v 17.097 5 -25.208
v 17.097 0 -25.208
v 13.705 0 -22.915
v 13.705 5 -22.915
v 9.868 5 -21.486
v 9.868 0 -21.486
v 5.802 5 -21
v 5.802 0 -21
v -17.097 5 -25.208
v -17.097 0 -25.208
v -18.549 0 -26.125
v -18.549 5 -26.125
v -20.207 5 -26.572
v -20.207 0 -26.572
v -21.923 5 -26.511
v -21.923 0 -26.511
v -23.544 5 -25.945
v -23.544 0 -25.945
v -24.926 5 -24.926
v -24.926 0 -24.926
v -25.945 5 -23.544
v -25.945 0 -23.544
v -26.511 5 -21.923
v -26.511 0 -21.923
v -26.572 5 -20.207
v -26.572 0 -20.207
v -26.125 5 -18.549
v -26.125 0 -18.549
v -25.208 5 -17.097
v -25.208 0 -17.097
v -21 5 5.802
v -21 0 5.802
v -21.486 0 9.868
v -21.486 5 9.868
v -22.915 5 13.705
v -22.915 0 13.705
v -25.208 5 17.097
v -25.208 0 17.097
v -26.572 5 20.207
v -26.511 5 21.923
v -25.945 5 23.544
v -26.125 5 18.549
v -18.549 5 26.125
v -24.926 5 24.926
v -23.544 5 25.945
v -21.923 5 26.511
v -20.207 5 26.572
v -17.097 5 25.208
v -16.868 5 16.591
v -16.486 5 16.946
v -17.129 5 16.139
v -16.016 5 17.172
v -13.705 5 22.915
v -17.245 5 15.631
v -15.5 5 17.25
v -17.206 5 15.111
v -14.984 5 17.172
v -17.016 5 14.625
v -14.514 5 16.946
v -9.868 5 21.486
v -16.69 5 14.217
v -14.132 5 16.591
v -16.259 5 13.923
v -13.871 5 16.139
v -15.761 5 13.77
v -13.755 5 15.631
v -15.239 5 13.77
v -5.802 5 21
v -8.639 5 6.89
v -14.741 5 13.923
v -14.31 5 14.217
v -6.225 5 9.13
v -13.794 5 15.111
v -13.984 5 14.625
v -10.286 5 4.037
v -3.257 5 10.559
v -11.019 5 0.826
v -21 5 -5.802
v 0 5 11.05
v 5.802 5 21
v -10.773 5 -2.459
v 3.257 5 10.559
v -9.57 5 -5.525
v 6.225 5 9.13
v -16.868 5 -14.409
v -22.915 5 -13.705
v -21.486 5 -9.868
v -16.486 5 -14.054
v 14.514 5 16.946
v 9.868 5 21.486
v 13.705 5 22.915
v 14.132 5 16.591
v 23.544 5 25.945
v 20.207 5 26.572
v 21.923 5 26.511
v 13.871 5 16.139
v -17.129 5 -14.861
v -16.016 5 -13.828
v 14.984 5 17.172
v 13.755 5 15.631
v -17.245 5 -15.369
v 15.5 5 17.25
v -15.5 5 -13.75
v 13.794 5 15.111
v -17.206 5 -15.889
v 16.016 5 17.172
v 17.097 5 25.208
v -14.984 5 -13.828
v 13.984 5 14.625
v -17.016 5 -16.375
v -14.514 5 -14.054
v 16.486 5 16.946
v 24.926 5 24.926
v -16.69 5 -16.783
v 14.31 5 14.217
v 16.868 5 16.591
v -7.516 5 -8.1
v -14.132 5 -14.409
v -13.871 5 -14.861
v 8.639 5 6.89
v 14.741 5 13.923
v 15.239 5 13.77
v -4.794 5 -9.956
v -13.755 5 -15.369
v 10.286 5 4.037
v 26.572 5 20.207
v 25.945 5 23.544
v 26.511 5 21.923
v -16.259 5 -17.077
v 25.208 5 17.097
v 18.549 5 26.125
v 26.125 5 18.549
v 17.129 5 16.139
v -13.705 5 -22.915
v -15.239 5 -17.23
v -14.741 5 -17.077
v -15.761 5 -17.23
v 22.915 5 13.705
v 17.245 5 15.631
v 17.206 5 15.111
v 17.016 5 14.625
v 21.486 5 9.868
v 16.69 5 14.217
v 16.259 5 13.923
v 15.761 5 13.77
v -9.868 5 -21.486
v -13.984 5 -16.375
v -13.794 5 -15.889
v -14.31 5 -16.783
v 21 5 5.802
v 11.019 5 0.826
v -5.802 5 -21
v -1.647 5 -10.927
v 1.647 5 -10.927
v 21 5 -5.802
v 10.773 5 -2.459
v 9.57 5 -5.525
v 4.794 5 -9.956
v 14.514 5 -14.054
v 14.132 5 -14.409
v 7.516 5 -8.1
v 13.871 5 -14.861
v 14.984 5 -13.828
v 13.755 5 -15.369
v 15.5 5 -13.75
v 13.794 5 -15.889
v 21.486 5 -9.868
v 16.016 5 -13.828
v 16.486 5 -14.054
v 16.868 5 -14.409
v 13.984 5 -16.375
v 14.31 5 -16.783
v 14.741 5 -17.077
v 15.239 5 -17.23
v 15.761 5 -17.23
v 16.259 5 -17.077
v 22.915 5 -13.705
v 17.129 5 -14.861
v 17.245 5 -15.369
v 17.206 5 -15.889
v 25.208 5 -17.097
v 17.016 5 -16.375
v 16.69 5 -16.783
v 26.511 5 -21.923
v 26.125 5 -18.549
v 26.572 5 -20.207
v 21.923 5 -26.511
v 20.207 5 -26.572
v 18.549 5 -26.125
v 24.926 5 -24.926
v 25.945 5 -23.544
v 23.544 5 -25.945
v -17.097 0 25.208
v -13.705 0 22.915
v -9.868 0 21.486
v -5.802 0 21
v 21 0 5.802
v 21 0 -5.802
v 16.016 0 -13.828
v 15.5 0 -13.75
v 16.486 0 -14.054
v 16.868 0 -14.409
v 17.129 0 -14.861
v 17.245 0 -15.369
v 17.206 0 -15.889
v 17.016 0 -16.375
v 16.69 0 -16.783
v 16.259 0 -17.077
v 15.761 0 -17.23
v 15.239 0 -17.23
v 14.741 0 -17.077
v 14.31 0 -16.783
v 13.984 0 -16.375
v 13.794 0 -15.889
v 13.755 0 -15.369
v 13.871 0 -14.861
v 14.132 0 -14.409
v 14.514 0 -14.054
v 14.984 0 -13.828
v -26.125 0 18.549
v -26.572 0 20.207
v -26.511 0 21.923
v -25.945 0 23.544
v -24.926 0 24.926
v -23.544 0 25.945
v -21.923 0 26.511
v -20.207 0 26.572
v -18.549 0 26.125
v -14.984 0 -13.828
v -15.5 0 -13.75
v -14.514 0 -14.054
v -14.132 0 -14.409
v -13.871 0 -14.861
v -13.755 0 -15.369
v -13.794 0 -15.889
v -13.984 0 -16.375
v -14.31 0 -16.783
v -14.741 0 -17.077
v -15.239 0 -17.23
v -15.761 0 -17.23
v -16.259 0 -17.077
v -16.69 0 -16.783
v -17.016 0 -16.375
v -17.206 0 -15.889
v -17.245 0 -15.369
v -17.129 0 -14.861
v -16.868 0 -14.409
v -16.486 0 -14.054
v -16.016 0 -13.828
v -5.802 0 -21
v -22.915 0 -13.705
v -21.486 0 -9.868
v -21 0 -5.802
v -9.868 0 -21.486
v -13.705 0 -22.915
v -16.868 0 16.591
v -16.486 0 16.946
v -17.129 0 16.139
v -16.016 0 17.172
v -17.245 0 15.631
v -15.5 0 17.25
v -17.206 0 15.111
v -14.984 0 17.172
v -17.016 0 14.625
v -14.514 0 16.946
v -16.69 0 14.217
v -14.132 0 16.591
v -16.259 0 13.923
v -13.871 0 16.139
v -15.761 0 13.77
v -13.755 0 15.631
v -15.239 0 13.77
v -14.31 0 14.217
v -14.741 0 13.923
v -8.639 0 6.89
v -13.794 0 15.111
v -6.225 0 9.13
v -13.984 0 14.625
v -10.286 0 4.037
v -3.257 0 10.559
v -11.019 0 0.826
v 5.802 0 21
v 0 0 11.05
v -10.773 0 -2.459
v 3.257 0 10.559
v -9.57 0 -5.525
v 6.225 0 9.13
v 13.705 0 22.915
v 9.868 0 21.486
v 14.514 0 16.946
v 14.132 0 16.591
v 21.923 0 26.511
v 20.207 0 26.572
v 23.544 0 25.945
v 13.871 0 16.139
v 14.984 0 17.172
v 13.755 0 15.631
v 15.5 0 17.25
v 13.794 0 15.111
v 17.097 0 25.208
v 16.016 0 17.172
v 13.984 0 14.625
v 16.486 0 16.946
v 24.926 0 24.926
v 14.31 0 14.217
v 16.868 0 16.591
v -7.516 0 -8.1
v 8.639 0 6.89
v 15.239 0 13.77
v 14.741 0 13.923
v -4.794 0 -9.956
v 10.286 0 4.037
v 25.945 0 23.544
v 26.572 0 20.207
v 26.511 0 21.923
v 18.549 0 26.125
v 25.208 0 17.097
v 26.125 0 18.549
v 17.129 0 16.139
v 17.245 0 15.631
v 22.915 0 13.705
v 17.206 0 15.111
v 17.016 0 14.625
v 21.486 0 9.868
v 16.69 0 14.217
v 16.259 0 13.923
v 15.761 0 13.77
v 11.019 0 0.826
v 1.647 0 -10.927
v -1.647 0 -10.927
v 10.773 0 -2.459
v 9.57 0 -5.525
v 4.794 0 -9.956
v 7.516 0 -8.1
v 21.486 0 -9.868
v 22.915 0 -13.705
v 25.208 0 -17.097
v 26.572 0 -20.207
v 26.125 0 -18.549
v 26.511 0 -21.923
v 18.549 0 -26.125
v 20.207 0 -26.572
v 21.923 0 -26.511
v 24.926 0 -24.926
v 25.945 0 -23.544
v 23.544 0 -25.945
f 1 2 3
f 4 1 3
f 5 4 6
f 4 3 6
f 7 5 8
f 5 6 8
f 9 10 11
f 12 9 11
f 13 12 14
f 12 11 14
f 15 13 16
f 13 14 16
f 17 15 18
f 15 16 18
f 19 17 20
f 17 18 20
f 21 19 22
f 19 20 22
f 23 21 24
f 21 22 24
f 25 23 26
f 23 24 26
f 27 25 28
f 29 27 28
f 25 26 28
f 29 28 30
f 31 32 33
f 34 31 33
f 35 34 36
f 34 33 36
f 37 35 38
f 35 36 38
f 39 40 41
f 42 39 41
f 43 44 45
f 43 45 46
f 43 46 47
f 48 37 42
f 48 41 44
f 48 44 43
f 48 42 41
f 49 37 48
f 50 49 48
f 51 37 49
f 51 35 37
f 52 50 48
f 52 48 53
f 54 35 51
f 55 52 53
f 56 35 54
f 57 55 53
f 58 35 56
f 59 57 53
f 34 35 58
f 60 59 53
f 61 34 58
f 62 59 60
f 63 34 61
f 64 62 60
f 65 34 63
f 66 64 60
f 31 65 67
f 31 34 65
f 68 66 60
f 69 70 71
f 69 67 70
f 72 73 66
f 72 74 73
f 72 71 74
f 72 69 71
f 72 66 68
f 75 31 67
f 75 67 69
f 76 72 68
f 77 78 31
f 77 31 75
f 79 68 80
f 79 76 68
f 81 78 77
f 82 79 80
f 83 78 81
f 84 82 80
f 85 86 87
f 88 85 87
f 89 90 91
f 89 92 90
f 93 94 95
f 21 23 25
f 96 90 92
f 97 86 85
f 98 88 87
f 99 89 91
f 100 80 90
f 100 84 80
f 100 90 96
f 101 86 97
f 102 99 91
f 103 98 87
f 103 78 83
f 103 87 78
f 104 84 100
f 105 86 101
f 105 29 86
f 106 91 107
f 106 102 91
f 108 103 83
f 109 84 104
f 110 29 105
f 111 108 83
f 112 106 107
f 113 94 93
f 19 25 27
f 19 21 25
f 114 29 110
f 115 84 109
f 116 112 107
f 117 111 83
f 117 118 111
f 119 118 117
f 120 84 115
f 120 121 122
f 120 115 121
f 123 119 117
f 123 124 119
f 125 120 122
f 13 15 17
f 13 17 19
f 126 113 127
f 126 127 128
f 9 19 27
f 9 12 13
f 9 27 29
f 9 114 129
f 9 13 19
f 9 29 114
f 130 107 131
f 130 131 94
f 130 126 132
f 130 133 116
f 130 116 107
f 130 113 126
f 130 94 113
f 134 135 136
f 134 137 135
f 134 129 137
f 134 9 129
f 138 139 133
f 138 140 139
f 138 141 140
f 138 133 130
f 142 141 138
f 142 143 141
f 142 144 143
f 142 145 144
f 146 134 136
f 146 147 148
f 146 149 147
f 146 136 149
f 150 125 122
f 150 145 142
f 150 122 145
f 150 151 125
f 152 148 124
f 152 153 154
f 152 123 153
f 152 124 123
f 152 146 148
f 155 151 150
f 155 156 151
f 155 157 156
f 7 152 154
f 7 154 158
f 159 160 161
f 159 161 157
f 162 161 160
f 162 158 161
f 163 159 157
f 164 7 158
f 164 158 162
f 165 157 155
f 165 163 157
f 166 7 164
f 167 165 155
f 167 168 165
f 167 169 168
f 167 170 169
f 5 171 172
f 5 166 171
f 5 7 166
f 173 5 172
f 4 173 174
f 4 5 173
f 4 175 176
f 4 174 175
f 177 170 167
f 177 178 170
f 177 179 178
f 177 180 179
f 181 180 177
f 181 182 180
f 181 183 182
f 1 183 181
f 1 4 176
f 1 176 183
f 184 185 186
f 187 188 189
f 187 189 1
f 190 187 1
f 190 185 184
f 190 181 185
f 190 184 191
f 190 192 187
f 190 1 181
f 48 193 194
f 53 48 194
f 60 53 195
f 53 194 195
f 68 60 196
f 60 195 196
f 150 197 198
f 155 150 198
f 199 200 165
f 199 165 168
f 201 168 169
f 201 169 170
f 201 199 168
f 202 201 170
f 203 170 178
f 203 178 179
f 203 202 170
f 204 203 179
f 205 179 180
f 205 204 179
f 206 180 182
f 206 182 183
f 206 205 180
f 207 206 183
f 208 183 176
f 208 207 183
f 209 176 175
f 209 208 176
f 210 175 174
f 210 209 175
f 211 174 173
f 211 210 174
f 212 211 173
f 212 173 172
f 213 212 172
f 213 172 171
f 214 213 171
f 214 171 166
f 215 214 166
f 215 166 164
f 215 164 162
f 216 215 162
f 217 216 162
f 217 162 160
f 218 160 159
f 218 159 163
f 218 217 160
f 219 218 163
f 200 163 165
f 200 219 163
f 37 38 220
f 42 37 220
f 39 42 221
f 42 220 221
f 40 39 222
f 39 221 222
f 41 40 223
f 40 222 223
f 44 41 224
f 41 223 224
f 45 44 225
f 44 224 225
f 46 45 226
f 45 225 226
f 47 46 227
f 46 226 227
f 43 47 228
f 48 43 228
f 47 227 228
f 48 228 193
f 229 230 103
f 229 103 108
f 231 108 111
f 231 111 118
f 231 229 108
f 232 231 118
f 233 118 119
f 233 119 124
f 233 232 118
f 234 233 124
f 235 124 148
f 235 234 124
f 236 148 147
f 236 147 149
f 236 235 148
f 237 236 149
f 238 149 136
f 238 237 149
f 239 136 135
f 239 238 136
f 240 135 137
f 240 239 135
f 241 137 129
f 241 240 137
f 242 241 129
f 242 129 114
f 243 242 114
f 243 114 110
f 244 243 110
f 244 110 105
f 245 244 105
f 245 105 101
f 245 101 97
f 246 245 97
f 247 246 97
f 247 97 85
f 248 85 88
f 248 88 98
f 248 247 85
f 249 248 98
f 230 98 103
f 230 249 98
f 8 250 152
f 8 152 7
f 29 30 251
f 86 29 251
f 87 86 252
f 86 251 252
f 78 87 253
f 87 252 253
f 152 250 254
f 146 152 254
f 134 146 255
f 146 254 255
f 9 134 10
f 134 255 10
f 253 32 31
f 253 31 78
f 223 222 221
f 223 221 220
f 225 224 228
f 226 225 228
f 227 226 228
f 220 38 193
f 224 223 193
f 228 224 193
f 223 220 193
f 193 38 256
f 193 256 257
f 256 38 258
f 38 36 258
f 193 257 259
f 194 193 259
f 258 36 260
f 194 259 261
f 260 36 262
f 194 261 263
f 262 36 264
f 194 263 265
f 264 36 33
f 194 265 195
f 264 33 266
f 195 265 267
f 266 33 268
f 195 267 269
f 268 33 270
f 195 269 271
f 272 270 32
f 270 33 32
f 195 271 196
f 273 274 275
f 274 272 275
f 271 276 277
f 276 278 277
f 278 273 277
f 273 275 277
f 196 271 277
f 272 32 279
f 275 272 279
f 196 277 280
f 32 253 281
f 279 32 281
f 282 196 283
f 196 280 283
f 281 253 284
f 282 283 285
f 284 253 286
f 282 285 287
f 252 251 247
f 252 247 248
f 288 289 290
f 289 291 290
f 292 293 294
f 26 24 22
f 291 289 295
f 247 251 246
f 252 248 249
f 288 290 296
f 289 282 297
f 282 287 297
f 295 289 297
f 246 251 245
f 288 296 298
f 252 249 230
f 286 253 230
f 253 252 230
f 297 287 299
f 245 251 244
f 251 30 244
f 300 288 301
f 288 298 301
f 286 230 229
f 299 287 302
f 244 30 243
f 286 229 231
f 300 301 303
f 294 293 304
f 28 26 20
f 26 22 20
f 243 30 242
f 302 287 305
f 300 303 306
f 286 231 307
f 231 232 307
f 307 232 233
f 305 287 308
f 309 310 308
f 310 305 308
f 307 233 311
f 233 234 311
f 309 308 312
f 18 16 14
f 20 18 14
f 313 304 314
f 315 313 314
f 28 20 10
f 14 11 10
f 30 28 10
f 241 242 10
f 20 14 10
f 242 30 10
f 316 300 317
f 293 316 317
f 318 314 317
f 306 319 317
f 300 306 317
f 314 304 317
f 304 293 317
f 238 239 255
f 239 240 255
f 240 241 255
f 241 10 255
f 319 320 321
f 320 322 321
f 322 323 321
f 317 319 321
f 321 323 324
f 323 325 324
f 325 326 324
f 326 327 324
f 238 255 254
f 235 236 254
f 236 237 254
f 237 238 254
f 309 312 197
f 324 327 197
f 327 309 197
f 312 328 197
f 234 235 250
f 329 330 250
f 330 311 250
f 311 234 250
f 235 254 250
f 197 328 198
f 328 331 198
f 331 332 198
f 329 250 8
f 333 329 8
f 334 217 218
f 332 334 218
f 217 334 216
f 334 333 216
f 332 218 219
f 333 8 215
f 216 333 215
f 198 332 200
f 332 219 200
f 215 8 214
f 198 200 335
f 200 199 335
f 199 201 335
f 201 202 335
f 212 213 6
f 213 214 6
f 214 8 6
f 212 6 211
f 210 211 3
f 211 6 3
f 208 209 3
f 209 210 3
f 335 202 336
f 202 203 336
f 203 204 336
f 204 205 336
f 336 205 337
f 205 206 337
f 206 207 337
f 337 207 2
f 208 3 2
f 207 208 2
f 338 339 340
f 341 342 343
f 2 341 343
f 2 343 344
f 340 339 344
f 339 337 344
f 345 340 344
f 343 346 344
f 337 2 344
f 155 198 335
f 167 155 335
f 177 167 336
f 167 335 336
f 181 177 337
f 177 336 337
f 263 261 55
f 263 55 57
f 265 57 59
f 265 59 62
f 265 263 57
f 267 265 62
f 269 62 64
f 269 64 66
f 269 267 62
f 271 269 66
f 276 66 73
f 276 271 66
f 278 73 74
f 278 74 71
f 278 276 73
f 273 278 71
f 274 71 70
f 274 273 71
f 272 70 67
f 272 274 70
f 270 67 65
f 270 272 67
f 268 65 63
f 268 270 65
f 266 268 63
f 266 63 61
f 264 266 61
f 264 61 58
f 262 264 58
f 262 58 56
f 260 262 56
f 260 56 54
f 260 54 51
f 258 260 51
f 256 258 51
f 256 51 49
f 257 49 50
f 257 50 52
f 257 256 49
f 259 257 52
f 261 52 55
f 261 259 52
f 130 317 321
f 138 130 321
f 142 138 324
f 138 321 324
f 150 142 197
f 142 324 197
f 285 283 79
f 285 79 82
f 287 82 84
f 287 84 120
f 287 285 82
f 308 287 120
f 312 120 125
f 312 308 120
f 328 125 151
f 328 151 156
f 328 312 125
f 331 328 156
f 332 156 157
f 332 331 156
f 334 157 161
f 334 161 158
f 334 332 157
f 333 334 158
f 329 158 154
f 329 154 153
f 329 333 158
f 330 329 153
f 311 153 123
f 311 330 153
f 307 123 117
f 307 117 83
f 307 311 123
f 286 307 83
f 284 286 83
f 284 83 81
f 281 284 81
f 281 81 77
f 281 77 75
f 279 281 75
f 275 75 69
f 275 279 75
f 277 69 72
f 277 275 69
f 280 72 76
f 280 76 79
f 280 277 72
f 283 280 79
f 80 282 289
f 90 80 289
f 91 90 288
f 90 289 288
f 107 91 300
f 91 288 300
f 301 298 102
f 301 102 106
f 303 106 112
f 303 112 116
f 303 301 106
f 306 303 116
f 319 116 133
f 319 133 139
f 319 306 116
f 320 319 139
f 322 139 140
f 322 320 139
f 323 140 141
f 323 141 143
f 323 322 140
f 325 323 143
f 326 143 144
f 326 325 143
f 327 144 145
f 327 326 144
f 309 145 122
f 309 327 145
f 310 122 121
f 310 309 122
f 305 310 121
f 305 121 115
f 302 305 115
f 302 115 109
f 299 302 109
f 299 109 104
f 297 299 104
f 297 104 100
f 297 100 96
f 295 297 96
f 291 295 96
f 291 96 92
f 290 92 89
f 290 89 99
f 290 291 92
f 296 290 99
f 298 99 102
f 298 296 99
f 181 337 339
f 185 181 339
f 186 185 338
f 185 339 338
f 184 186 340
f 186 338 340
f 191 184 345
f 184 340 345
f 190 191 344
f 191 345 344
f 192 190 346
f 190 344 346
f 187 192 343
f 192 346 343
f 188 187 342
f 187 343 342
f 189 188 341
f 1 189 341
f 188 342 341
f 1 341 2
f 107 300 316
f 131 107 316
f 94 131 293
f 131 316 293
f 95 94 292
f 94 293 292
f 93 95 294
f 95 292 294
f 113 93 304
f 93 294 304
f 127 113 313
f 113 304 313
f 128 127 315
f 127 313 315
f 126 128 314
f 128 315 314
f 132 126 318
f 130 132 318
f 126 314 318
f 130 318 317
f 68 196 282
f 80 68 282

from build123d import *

# Parameters (mm, degrees)
SKETCH_1_W      = 42
SKETCH_1_H      = 42
SKETCH_1_R      = 11.05
SKETCH_1_R_2    = 1.75
EXTRUDE_1_DEPTH = 5
EXTRUDE_2_DEPTH = 5


with BuildPart() as part:
    # 草图1 → 凸台-拉伸1 (new body)
    with BuildSketch(Plane(origin=(0, 0, 0), x_dir=(1, 0, 0), z_dir=(0, 1, 0))):
        Rectangle(SKETCH_1_W, SKETCH_1_H)
        with Locations(Location((0, 0, 0), (0, 0, 270))):
            Circle(SKETCH_1_R, mode=Mode.SUBTRACT)
        with Locations(Location((15.5, 15.5, 0), (0, 0, 270))):
            Circle(SKETCH_1_R_2, mode=Mode.SUBTRACT)
        with Locations(Location((15.5, -15.5, 0), (0, 0, 270))):
            Circle(SKETCH_1_R_2, mode=Mode.SUBTRACT)
        with Locations(Location((-15.5, -15.5, 0), (0, 0, 270))):
            Circle(SKETCH_1_R_2, mode=Mode.SUBTRACT)
        with Locations(Location((-15.5, 15.5, 0), (0, 0, 270))):
            Circle(SKETCH_1_R_2, mode=Mode.SUBTRACT)
    extrude(amount=EXTRUDE_1_DEPTH)

    # 草图2 → 凸台-拉伸2 (add)
    with BuildSketch(Plane(origin=(0, 0, 0), x_dir=(1, 0, 0), z_dir=(0, 1, 0))):
        with BuildLine():
            Line((-5.80218169, -21), (-21, -21))
            Line((-21, -21), (-21, -5.80218169))
            ThreePointArc((-21, -5.80218169), (-22.086185579, -11.829035113), (-25.208061098, -17.097493573))
            ThreePointArc((-25.208061098, -17.097493573), (-24.925514037, -24.925514037), (-17.097493573, -25.208061098))
            ThreePointArc((-17.097493573, -25.208061098), (-11.829035113, -22.086185579), (-5.80218169, -21))
        make_face()
        with BuildLine():
            Line((21, -5.80218169), (21, -21))
            Line((21, -21), (5.80218169, -21))
            ThreePointArc((5.80218169, -21), (11.829035113, -22.086185579), (17.097493573, -25.208061098))
            ThreePointArc((17.097493573, -25.208061098), (24.925514037, -24.925514037), (25.208061098, -17.097493573))
            ThreePointArc((25.208061098, -17.097493573), (22.086185579, -11.829035113), (21, -5.80218169))
        make_face()
        with BuildLine():
            Line((-21, 5.80218169), (-21, 21))
            Line((-21, 21), (-5.80218169, 21))
            ThreePointArc((-5.80218169, 21), (-11.829035113, 22.086185579), (-17.097493573, 25.208061098))
            ThreePointArc((-17.097493573, 25.208061098), (-24.925514037, 24.925514037), (-25.208061098, 17.097493573))
            ThreePointArc((-25.208061098, 17.097493573), (-22.086185579, 11.829035113), (-21, 5.80218169))
        make_face()
        with BuildLine():
            Line((5.80218169, 21), (21, 21))
            Line((21, 21), (21, 5.80218169))
            ThreePointArc((21, 5.80218169), (22.086185579, 11.829035113), (25.208061098, 17.097493573))
            ThreePointArc((25.208061098, 17.097493573), (24.925514037, 24.925514037), (17.097493573, 25.208061098))
            ThreePointArc((17.097493573, 25.208061098), (11.829035113, 22.086185579), (5.80218169, 21))
        make_face()
    extrude(amount=EXTRUDE_2_DEPTH)


solid = part.part
